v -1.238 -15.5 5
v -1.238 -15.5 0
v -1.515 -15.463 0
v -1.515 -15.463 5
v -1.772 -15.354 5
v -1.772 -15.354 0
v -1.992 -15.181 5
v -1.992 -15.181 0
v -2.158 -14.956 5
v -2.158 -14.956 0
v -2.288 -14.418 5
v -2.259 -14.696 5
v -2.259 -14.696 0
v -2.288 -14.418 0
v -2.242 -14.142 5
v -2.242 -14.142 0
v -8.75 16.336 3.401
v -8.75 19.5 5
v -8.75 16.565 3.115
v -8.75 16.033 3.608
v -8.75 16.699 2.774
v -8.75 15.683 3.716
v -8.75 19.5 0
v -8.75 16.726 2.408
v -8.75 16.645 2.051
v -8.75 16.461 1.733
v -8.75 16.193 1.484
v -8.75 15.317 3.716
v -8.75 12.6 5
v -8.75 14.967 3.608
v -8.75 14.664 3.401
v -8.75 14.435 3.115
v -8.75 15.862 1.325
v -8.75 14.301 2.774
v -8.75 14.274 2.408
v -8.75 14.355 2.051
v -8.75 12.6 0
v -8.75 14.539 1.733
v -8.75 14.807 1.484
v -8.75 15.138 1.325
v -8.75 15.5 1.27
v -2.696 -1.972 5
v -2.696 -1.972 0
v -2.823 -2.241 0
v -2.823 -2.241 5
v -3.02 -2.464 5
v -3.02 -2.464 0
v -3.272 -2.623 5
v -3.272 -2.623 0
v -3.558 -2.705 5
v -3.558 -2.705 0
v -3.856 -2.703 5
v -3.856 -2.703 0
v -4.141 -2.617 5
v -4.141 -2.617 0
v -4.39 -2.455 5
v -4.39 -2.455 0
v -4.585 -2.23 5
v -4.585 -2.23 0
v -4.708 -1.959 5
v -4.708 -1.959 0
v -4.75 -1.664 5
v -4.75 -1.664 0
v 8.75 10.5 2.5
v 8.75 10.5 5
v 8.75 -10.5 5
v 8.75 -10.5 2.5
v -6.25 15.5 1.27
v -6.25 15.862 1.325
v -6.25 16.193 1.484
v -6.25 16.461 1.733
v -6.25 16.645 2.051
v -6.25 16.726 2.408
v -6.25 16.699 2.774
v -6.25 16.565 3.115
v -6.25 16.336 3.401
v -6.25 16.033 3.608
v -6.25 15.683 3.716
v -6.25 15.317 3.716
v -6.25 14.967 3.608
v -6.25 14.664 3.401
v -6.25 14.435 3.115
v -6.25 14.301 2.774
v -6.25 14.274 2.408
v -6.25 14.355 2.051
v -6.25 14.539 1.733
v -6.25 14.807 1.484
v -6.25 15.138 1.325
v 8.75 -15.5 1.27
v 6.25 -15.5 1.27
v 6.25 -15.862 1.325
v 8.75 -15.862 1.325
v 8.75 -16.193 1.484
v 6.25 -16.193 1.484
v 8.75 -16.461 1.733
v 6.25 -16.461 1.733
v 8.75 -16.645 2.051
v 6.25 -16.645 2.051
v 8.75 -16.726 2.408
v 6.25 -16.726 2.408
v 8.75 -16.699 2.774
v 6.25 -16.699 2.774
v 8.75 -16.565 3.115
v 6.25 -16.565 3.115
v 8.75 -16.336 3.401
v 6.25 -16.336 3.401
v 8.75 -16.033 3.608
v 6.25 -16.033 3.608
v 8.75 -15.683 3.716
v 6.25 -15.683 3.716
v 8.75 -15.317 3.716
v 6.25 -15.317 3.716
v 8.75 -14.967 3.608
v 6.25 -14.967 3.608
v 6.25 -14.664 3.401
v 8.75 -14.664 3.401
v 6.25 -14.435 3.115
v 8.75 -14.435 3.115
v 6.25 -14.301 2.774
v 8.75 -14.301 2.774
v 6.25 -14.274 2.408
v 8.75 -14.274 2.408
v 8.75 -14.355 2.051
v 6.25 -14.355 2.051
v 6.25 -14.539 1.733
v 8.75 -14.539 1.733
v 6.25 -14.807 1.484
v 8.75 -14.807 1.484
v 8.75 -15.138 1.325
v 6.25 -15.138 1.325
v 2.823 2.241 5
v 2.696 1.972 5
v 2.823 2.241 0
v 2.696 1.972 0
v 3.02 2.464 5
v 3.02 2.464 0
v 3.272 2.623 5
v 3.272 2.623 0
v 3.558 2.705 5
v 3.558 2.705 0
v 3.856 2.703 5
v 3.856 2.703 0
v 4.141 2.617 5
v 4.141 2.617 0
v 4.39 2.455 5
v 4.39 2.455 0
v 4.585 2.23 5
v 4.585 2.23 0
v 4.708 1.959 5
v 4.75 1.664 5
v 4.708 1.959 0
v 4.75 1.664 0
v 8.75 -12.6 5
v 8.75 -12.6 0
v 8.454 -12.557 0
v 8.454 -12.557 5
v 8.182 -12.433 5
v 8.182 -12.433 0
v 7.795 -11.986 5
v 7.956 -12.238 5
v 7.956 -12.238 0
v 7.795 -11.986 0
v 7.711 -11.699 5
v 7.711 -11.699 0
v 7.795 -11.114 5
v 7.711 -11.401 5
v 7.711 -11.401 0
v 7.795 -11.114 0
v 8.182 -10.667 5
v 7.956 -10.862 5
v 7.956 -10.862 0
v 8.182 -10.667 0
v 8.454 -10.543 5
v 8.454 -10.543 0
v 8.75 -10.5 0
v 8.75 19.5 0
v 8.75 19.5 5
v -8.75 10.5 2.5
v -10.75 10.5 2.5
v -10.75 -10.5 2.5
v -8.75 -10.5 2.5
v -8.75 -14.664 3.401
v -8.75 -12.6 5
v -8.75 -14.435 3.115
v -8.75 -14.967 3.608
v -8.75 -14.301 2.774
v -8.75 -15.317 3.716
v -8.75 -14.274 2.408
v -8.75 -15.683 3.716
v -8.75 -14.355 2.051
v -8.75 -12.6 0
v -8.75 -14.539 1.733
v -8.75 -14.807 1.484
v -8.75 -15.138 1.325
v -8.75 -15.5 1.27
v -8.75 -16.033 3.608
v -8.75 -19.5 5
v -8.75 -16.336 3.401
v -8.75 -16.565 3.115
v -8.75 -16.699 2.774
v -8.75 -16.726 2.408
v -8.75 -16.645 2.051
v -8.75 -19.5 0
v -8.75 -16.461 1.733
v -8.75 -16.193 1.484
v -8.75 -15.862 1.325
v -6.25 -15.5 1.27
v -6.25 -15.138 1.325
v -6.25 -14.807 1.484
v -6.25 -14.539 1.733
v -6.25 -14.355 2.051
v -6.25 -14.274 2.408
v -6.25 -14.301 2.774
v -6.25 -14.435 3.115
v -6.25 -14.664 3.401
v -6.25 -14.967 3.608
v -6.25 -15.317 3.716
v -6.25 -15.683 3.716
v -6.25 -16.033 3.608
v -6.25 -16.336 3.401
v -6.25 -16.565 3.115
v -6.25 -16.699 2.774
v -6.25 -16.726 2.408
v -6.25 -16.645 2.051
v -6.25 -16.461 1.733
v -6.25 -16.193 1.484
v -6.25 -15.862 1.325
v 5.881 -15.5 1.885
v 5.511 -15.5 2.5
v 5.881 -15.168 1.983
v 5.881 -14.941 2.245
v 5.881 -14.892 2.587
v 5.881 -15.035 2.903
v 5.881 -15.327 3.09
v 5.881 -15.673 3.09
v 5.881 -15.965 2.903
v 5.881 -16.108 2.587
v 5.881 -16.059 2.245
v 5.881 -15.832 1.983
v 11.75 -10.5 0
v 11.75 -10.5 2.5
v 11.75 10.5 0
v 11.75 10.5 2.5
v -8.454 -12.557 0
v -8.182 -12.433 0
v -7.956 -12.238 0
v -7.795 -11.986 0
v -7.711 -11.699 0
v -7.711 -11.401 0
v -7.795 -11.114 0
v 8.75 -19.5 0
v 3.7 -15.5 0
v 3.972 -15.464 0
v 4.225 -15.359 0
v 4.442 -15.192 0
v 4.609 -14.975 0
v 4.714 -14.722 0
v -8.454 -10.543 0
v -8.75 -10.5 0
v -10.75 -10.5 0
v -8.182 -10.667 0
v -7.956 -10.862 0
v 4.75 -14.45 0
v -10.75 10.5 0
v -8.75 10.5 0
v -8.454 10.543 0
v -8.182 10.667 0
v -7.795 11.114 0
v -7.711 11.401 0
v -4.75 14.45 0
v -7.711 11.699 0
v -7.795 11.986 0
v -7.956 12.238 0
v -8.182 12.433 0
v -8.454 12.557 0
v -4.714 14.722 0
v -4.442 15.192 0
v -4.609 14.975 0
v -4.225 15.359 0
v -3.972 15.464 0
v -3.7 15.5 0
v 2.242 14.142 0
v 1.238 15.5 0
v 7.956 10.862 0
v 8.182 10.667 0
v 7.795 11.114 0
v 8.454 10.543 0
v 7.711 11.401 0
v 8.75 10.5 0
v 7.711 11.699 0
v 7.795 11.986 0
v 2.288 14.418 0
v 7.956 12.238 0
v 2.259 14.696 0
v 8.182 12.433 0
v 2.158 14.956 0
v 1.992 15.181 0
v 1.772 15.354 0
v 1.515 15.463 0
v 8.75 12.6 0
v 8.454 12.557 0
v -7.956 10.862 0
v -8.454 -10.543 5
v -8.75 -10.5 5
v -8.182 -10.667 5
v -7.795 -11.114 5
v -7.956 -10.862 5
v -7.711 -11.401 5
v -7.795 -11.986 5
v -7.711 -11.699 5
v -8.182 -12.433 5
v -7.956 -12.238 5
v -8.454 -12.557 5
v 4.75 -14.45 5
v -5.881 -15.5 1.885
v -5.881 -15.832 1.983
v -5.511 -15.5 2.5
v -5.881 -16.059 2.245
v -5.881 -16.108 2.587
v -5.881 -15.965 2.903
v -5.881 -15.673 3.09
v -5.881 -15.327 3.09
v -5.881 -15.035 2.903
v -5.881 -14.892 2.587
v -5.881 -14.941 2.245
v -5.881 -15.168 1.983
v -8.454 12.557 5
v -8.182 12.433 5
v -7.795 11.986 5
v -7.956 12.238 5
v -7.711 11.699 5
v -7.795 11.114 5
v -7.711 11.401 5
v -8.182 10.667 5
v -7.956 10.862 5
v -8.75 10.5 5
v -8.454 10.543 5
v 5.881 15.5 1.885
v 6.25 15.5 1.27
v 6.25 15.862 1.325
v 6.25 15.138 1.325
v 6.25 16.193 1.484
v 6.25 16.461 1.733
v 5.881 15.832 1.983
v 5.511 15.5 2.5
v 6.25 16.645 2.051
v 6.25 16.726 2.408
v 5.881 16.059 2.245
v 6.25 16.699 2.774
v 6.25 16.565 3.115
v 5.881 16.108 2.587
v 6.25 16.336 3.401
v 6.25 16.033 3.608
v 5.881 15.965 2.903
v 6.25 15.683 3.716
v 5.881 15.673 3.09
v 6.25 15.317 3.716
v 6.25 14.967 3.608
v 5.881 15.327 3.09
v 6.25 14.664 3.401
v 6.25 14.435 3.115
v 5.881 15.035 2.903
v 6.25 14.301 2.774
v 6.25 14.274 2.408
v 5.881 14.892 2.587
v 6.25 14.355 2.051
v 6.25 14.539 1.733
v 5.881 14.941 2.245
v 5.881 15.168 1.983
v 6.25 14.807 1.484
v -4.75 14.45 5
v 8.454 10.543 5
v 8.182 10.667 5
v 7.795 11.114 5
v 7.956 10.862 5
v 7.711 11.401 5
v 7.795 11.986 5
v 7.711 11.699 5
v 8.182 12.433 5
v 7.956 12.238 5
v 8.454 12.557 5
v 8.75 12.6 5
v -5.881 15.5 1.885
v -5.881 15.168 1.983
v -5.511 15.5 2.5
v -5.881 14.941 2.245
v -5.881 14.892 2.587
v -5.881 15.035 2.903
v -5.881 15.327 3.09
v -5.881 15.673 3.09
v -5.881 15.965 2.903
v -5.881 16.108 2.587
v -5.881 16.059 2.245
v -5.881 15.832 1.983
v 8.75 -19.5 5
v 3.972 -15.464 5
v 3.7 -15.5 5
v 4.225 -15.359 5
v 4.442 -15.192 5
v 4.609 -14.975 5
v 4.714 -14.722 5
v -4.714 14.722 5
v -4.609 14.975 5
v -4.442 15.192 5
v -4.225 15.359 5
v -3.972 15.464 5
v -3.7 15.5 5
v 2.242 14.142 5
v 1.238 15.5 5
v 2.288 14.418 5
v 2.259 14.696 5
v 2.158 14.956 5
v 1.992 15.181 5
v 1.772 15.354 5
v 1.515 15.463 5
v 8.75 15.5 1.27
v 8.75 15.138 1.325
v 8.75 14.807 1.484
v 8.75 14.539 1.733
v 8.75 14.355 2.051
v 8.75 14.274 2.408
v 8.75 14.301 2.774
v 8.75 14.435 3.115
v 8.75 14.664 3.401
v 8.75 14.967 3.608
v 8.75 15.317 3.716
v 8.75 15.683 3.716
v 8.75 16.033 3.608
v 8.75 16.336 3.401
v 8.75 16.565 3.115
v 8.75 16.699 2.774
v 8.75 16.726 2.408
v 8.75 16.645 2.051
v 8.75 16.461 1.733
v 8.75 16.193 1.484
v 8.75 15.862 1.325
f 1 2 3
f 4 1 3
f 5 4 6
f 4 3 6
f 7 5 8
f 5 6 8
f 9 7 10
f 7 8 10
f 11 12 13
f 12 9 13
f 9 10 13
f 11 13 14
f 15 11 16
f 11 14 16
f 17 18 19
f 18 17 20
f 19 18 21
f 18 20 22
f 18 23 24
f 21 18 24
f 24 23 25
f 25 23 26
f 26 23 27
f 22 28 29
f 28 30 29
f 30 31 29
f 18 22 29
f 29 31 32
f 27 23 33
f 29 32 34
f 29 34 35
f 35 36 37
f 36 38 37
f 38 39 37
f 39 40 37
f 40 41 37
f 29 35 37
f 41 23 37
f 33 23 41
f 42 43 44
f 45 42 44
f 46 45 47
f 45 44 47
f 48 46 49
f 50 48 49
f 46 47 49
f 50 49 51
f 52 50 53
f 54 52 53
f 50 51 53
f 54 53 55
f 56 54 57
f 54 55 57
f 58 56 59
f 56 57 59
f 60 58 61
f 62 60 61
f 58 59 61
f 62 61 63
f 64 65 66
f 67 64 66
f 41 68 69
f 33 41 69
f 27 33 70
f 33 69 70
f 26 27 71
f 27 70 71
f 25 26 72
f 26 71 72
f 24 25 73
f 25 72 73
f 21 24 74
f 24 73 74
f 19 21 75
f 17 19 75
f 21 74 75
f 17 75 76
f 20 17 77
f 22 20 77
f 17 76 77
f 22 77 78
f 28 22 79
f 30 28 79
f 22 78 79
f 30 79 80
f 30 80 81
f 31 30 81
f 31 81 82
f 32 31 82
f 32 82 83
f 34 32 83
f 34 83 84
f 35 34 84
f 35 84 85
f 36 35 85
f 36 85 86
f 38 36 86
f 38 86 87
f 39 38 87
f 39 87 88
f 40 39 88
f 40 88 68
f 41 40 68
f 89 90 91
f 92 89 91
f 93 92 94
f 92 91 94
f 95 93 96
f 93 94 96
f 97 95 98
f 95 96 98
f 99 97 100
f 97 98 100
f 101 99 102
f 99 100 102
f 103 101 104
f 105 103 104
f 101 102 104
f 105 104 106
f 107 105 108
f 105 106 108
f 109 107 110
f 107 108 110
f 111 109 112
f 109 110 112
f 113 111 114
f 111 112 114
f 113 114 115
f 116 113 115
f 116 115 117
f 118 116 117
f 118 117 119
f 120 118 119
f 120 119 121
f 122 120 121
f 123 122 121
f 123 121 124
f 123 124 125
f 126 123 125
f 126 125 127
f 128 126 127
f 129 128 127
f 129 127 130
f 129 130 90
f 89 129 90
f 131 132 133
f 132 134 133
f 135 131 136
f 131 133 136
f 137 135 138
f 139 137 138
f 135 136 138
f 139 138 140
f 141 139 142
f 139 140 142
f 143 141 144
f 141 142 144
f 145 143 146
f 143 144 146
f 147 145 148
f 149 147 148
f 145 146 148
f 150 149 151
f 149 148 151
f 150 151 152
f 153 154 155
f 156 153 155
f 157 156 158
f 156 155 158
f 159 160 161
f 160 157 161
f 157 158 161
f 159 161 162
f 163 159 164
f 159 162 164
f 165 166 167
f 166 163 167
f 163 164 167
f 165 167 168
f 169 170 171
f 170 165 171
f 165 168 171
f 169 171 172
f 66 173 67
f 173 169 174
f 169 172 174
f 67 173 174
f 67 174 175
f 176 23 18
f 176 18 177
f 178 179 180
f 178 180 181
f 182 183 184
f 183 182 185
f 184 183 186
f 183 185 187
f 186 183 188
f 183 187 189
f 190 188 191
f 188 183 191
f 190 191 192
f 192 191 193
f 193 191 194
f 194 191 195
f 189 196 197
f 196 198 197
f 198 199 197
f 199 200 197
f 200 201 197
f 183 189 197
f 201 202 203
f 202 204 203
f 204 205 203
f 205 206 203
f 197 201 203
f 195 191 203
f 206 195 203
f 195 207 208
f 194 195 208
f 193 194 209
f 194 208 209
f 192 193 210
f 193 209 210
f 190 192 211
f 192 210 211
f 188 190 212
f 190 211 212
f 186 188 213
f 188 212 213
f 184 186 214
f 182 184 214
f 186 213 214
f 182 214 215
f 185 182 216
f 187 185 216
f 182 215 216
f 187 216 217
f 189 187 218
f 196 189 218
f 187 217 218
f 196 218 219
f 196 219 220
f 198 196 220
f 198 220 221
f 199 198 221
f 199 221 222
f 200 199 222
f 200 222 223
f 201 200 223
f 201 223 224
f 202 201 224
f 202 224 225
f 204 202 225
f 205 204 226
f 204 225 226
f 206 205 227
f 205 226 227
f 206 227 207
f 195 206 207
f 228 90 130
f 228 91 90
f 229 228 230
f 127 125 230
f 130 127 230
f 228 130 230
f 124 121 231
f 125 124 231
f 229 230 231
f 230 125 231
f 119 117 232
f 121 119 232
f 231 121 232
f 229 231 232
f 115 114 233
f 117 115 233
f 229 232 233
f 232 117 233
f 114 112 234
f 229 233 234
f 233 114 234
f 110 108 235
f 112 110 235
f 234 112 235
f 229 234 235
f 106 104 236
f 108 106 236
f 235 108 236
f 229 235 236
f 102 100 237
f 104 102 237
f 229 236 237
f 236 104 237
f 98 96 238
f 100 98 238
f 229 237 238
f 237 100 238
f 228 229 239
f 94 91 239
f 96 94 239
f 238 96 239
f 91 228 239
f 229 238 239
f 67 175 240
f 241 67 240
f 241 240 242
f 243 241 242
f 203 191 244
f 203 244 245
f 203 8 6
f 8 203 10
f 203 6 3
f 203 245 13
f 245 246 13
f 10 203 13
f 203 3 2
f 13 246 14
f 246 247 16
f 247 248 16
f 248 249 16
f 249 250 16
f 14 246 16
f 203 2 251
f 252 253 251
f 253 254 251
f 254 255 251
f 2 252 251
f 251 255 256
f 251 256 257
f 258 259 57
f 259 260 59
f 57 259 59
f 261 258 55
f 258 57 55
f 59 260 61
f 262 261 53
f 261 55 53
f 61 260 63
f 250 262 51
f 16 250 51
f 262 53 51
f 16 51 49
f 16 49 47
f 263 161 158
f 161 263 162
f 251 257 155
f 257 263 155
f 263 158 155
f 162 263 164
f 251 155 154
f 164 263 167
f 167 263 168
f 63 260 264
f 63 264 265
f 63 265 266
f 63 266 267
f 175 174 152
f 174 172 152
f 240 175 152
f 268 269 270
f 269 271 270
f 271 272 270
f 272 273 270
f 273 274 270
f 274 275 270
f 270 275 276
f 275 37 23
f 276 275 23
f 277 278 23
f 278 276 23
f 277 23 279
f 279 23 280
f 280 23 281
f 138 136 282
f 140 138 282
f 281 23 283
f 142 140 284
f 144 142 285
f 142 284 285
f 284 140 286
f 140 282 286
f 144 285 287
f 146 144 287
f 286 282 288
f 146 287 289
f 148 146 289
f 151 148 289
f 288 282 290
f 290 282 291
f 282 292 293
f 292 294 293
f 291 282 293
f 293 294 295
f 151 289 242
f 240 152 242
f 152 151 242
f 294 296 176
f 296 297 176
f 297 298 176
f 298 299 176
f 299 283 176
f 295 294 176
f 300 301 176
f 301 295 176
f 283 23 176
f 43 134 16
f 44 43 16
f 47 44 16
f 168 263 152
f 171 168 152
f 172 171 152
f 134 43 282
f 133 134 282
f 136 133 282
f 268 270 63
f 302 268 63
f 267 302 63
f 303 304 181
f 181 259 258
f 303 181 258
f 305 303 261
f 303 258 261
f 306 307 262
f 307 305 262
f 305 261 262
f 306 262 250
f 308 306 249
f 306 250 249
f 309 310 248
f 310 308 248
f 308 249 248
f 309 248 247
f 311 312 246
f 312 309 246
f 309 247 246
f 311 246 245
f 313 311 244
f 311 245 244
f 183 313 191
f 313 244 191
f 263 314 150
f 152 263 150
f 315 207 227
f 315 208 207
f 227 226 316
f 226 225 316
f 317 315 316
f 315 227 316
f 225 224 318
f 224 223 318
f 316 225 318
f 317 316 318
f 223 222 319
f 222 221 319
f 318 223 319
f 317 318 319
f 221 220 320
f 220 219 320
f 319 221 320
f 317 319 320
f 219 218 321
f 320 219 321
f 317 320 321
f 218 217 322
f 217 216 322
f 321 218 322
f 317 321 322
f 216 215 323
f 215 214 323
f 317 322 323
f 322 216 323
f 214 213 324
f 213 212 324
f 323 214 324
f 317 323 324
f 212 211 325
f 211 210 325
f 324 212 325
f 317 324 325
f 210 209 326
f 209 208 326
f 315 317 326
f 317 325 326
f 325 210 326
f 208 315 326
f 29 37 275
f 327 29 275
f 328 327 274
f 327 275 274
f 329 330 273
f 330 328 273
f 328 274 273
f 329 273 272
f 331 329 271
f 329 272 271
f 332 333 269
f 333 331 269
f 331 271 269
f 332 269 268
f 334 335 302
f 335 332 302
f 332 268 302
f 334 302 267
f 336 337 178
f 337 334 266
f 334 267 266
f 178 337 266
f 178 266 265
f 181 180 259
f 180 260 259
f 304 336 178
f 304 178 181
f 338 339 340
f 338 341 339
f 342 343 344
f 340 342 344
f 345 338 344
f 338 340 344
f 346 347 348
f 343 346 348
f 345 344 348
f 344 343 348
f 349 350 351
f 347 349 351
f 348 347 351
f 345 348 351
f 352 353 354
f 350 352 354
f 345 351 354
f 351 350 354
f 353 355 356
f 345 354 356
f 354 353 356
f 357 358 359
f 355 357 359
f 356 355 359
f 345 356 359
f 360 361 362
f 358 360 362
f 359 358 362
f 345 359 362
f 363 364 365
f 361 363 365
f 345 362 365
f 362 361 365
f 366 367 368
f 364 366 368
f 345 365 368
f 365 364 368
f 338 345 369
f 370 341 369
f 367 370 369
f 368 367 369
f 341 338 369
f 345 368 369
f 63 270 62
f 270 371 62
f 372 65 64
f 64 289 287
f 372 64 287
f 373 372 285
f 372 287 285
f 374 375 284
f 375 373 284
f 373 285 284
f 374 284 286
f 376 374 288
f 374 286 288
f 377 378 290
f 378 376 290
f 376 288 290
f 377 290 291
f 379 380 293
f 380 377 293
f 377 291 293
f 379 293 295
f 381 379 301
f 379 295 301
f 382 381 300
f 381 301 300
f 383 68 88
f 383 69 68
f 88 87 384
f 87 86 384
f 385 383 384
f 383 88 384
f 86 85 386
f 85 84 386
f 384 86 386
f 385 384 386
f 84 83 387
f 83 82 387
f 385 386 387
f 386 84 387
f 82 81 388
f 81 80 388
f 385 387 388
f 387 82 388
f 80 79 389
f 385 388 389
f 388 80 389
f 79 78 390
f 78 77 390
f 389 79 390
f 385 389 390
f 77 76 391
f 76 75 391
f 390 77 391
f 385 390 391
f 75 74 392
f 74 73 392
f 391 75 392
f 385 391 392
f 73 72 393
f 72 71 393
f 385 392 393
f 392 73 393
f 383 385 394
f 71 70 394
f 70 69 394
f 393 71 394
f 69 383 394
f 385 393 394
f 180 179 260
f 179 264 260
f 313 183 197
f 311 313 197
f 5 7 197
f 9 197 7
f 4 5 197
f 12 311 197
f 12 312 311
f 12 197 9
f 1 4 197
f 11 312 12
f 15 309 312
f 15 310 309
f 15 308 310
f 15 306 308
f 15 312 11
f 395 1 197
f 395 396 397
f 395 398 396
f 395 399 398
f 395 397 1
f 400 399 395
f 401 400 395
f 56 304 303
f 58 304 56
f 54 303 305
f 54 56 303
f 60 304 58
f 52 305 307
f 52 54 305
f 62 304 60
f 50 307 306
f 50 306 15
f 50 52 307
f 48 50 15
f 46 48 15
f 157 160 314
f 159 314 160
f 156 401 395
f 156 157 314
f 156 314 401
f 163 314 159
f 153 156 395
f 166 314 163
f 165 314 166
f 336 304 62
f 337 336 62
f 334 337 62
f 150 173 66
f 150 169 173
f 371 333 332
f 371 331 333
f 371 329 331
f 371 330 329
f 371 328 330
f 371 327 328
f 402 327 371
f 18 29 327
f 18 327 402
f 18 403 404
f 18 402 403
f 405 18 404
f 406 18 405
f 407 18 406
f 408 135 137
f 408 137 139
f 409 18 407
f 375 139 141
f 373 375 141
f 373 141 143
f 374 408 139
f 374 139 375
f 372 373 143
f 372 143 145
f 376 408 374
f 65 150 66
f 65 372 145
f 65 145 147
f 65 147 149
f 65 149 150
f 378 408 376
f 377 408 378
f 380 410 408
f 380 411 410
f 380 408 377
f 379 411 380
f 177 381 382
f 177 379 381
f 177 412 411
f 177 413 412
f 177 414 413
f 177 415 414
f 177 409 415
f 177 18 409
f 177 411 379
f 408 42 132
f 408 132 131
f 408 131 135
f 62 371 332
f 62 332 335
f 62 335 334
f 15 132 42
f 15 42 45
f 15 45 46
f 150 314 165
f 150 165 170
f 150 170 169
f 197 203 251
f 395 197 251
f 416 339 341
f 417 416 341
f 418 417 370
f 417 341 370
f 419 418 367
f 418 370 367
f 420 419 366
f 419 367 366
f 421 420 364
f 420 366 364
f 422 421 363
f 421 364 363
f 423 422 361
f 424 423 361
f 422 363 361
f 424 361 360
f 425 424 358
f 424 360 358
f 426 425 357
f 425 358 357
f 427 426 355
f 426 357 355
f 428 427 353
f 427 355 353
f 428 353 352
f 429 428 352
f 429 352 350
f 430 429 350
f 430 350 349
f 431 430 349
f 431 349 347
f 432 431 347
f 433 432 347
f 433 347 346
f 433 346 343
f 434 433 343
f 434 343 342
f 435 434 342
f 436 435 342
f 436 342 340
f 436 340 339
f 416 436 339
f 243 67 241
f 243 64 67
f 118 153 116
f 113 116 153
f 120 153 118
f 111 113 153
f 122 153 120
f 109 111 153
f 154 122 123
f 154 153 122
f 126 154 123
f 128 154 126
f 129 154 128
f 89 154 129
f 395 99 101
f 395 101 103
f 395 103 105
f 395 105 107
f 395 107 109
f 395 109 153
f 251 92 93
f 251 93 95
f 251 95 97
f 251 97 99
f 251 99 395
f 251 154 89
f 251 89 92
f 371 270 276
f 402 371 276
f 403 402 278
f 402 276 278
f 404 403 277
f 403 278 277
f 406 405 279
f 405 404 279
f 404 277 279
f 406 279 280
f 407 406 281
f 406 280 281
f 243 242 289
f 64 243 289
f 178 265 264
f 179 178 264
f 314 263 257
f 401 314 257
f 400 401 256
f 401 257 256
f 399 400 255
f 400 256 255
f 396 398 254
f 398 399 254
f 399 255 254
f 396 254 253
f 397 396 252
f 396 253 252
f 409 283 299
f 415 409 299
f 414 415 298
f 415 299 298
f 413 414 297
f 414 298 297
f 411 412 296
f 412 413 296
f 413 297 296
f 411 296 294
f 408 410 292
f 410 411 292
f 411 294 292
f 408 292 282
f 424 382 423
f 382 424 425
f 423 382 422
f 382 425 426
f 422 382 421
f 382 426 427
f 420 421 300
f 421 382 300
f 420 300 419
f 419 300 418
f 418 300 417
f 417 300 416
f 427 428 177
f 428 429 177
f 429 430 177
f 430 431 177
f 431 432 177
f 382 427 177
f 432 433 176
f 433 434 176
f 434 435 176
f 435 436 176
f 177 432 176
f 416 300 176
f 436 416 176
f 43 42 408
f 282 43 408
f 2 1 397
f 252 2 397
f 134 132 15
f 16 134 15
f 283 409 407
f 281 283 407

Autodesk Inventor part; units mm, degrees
ref_plane "YZ Plane" through (0, 0, 0) normal (1, 0, 0) x (0, 1, 0)
ref_plane "XZ Plane" through (0, 0, 0) normal (0, 1, 0) x (-1, 0, 0)
ref_plane "XY Plane" through (0, 0, 0) normal (0, 0, 1) x (1, 0, 0)
sketch "スケッチ1" plane through (0, 0, 0) normal (0, 0, 1) x (1, 0, 0)
  line L0 (-8.75, -19.5) -> (8.75, -19.5) construction
  line L1 (8.75, -19.5) -> (8.75, 19.5) construction
  line L2 (8.75, 19.5) -> (-8.75, 19.5) construction
  line L3 (-8.75, 19.5) -> (-8.75, -19.5) construction
  line L4 (-8.75, -19.5) -> (8.75, 19.5) construction
  line L5 (8.75, -19.5) -> (-8.75, 19.5) construction
  line L6 (-8.75, 10.5) -> (-8.75, 19.5) construction
  line L7 (-8.75, 19.5) -> (8.75, 19.5)
  line L8 (8.75, 19.5) -> (8.75, 10.5) construction
  line L9 (-8.75, 10.5) -> (-10.75, 10.5)
  line L10 (-10.75, 10.5) -> (-10.75, -10.5)
  line L11 (-10.75, -10.5) -> (-8.75, -10.5)
  line L12 (-8.75, -10.5) -> (-8.75, -19.5) construction
  line L13 (-8.75, -19.5) -> (8.75, -19.5)
  line L14 (8.75, -19.5) -> (8.75, -10.5) construction
  line L15 (8.75, -10.5) -> (11.75, -10.5)
  line L16 (11.75, -10.5) -> (11.75, 10.5)
  line L17 (11.75, 10.5) -> (8.75, 10.5)
  line L18 (0, 0) -> (11.75, 0) construction
  circle A0 centre (-8.75, 11.55) radius 1.05 construction
  circle A1 centre (-8.75, -11.55) radius 1.05 construction
  circle A2 centre (8.75, 11.55) radius 1.05 construction
  circle A3 centre (8.75, -11.55) radius 1.05 construction
  line L19 (-8.75, 19.5) -> (-8.75, 12.6)
  arc A4 (-8.75, 10.5) -> (-8.75, 12.6) centre (-8.75, 11.55) ccw
  arc A5 (-8.75, -12.6) -> (-8.75, -10.5) centre (-8.75, -11.55) ccw
  line L20 (-8.75, -12.6) -> (-8.75, -19.5)
  line L21 (8.75, 12.6) -> (8.75, 19.5)
  arc A6 (8.75, 12.6) -> (8.75, 10.5) centre (8.75, 11.55) ccw
  line L22 (8.75, -12.6) -> (8.75, -19.5)
  arc A7 (8.75, -10.5) -> (8.75, -12.6) centre (8.75, -11.55) ccw
  dimension "d21" = 2
  dimension "d23" = 3
  dimension "d30" = 17.5
  dimension "d48" = 9
  dimension "d49" = 39
  dimension "d50" = 2.1
extrude "押し出し1" add sketch "スケッチ1" along normal blind 5
sketch "スケッチ2" plane through (8.75, -19.5, 0) normal (1, 0, 0) x (0, 0, -1)
  line L0 (0, 0) -> (-5, 0) projected
  line L1 (0, 39) -> (-5, 39) projected
  point P0 (0, 19.5)
  point P1 (-2.5, 4)
  point P2 (-2.5, 35)
  point P3 (-2.5, 0)
  dimension "d53" = 4
  dimension "d54" = 4
hole "穴1" at (8.75, -15.5, 2.5) at (8.75, 15.5, 2.5) direction (-1, 0, 0) diameter 2.459 depth 2.5 tip angle 118 thread size "M3x0.5" class "6H" standard "ISO Metric profile"
mirror "ミラー1" about plane through (0, 0, 0) normal (1, 0, 0) of "穴1"
sketch "スケッチ3" plane through (0, 0, 5) normal (0, 0, 1) x (1, 0, 0)
  line L0 (8.75, 12.6) -> (8.75, 19.5) projected
  line L1 (-8.75, 19.5) -> (-8.75, 12.6) projected
  line L2 (-13.3307, 15.6684) -> (-8.75, 15.6684)
  line L3 (-8.75, 15.6684) -> (-8.75, -16.7148)
  line L4 (-8.75, -16.7148) -> (-13.3307, -16.7148)
  line L5 (-13.3307, -16.7148) -> (-13.3307, 15.6684)
  line L6 (14.2214, 11.55) -> (8.75, 11.55)
  line L7 (8.75, 11.55) -> (8.75, -15.9078)
  line L8 (8.75, -15.9078) -> (14.2214, -15.9078)
  line L9 (14.2214, -15.9078) -> (14.2214, 11.55)
  point P0 (0, 0)
extrude "押し出し2" cut sketch "スケッチ3" against normal blind 2.5
sketch "スケッチ4" plane through (0, 0, 5) normal (0, 0, 1) x (1, 0, 0)
  line L0 (8.75, 12.6) -> (8.75, 19.5) projected
  line L1 (8.75, 19.5) -> (-8.75, 19.5) projected
  line L2 (-8.75, -12.6) -> (-8.75, -19.5) projected
  line L3 (-8.75, -19.5) -> (8.75, -19.5) projected
  line L4 (-4.75, 15.5) -> (4.75, 15.5) construction
  line L5 (4.75, 15.5) -> (4.75, -15.5) construction
  line L6 (4.75, -15.5) -> (-4.75, -15.5) construction
  line L7 (-4.75, -15.5) -> (-4.75, 15.5) construction
  line L8 (4.75, 15.5) -> (-4.75, -15.5) construction
  line L9 (2.6582, 15.5) -> (-4.75, 15.5)
  line L10 (-4.75, 15.5) -> (-4.75, -8.6741)
  line L11 (-4.75, -8.6741) -> (2.6582, 15.5)
  line L12 (-2.6582, -15.5) -> (4.75, -15.5)
  line L13 (4.75, -15.5) -> (4.75, 8.6741)
  line L14 (4.75, 8.6741) -> (-2.6582, -15.5)
  point P0 (0, 0)
  dimension "d64" = 4
  dimension "d65" = 4
  dimension "d66" = 4
  dimension "d67" = 4
  dimension "d68" = 4
extrude "押し出し3" cut sketch "スケッチ4" against normal blind 5
fillet "フィレット1" radius 1.05 6 edges at (-2.6582, -15.5, 2.5) (-4.75, 15.5, 2.5) (2.6582, 15.5, 2.5) (4.75, 8.6741, 2.5) (-4.75, -8.6741, 2.5) (4.75, -15.5, 2.5)
equation "\"d48\" = d26 + d35"
equation "\"d49\" = d38"
equation "\"d53\" = d35"
equation "\"d54\" = d53"
equation "\"d66\" = d65"
equation "\"d68\" = d67"
equation "\"d26\" = 5"
equation "\"d35\" = 4"
equation "\"d38\" = 39"
properties part number "胴体_メインフレーム_1_12" material "アセタール樹脂、黒"
